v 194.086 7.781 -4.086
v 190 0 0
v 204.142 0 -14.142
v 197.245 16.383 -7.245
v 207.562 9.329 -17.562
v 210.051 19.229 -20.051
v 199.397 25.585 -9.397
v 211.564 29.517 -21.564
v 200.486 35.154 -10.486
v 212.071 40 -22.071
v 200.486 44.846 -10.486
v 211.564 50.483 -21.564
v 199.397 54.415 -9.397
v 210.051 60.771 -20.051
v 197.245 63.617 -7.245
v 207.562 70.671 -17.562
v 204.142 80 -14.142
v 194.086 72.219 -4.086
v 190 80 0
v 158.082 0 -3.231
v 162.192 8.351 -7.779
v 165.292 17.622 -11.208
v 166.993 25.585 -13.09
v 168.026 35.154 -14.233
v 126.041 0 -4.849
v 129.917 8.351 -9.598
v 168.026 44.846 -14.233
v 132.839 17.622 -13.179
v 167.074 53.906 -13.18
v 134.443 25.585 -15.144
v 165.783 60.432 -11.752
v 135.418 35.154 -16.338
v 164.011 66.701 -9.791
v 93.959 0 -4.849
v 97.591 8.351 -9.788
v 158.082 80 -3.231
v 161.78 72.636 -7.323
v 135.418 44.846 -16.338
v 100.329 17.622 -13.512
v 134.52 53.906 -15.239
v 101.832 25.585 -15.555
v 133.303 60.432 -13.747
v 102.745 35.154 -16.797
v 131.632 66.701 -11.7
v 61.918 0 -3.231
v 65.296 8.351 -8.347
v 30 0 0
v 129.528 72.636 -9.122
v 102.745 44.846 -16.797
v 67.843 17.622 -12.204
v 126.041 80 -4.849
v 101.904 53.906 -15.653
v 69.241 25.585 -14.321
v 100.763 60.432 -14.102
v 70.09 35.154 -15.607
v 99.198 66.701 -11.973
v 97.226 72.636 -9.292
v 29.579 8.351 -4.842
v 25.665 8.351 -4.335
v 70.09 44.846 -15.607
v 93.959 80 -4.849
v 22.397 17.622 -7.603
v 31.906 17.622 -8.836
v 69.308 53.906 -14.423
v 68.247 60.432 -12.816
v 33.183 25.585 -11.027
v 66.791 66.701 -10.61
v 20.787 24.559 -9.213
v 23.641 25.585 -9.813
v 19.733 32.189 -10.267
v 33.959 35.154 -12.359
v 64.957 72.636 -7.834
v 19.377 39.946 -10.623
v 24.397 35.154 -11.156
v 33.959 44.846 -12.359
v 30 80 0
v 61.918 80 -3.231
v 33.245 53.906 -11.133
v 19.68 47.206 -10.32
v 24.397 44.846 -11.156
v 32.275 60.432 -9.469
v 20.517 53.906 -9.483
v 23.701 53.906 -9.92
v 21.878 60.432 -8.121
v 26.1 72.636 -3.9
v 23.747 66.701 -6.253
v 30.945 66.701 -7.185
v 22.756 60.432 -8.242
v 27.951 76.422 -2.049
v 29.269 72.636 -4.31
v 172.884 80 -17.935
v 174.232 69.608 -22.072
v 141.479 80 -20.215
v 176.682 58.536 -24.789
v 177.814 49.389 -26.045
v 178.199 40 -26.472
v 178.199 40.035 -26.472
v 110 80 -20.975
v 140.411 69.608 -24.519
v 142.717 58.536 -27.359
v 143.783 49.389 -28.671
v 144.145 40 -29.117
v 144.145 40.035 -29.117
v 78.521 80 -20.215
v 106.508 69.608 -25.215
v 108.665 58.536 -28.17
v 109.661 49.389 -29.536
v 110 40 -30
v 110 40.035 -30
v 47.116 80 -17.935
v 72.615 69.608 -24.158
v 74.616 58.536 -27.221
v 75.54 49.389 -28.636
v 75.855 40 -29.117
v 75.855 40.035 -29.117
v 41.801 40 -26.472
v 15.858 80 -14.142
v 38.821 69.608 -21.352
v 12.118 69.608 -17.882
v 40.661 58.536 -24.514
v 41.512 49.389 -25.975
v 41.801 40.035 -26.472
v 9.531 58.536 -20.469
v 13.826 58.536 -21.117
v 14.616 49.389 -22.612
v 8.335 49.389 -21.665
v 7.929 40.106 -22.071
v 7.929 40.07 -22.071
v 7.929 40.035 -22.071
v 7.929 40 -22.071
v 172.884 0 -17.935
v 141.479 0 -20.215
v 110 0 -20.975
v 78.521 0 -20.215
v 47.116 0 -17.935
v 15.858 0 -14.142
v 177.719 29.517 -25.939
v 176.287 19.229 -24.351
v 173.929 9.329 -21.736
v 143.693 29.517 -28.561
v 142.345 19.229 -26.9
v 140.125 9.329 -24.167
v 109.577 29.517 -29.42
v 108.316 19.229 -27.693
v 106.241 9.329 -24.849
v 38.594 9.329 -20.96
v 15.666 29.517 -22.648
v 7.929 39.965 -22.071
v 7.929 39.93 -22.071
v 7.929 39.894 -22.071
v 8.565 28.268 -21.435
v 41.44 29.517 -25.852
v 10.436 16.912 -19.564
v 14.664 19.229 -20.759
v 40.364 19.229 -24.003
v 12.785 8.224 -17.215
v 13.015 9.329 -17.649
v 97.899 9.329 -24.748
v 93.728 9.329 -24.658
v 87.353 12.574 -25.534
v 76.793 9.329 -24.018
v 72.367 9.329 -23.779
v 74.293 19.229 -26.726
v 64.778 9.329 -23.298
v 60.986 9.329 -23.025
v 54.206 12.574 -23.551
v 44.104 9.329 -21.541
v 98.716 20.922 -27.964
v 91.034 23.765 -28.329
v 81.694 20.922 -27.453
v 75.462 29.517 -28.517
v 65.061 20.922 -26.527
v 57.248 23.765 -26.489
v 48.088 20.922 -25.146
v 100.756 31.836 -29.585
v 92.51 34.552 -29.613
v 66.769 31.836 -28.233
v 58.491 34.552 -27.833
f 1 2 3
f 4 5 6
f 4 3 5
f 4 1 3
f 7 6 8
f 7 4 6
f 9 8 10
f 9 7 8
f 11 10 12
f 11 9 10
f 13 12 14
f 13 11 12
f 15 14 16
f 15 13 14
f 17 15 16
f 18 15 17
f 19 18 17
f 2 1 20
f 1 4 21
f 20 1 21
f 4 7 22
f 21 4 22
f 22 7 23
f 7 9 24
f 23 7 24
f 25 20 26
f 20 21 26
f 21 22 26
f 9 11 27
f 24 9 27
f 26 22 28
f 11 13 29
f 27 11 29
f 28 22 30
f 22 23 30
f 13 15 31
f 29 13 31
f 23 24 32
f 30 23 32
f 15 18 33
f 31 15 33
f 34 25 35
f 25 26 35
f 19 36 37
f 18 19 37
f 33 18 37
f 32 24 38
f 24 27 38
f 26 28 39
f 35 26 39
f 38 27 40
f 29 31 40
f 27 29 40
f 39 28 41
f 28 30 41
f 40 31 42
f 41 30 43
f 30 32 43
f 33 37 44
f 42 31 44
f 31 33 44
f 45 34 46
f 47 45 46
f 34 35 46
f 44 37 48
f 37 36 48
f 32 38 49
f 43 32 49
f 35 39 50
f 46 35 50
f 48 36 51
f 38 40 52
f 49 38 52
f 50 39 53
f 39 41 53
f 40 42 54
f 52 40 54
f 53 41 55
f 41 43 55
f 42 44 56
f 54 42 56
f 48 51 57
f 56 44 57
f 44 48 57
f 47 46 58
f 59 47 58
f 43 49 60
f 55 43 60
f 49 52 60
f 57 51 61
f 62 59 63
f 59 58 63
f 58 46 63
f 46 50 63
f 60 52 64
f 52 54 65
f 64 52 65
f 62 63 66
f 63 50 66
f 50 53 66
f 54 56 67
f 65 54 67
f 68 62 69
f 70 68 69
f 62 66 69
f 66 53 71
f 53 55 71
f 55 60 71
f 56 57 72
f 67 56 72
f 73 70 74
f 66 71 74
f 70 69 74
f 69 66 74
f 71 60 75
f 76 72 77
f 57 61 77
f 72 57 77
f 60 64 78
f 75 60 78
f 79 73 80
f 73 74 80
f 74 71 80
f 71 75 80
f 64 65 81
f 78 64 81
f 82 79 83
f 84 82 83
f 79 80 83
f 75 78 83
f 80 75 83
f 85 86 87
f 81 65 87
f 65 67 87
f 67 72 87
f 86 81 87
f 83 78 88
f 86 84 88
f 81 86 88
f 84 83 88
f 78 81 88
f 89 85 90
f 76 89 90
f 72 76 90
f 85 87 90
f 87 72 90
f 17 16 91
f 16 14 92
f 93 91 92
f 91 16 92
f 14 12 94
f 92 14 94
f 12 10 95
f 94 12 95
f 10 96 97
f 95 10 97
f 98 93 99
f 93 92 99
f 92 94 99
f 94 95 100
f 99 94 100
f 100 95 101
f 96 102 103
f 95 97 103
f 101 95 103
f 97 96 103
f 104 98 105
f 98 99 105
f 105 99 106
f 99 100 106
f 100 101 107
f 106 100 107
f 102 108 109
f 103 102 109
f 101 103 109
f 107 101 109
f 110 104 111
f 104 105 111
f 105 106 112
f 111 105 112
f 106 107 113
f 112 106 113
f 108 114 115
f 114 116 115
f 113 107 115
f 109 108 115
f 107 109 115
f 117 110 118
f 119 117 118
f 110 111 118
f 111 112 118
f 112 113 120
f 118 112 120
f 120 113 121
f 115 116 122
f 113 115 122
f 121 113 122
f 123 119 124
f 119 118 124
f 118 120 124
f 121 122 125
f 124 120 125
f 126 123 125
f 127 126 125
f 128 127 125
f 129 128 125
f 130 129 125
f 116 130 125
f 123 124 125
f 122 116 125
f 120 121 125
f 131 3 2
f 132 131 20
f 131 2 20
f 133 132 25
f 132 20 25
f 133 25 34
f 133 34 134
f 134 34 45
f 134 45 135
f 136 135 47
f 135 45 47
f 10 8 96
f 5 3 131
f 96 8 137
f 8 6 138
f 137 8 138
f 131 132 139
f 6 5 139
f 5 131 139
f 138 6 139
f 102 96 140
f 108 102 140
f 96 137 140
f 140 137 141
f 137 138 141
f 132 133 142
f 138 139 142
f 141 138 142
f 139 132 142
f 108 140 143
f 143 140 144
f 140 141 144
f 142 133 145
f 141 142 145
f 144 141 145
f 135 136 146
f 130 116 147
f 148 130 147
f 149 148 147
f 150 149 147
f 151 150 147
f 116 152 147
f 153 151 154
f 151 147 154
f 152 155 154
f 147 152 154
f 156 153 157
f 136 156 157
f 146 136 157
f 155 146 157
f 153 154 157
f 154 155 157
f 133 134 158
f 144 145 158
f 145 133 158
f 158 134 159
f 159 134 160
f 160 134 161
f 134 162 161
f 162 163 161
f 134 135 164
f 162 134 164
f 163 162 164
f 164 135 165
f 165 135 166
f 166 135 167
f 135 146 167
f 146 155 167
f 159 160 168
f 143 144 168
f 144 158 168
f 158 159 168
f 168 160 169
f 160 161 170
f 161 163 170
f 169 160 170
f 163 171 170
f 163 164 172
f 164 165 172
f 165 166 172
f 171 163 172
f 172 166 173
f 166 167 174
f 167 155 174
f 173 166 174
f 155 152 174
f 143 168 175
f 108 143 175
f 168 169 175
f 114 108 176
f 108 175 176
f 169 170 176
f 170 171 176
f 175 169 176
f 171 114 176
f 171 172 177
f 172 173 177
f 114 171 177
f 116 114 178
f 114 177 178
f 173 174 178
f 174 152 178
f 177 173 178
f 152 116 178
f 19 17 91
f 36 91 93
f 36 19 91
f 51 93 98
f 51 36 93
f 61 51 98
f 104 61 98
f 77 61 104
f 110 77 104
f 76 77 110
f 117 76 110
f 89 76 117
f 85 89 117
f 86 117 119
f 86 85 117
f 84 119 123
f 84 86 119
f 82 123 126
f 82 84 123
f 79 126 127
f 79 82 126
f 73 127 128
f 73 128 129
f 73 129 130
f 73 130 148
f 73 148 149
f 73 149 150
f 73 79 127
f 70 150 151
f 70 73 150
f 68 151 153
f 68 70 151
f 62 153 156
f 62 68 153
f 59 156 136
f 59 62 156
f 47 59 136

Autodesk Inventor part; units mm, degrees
ref_plane "YZ Plane" through (0, 0, 0) normal (1, 0, 0) x (0, 1, 0)
ref_plane "XZ Plane" through (0, 0, 0) normal (0, 1, 0) x (-1, 0, 0)
ref_plane "XY Plane" through (0, 0, 0) normal (0, 0, 1) x (1, 0, 0)
sketch "Эскиз1" plane through (0, 0, 0) normal (0, 1, 0) x (-1, 0, 0)
  line L0 (0, 0) -> (-220, 0)
  line L1 (-220, 0) -> (-220, -30)
  line L2 (-220, -30) -> (0, -30)
  line L3 (0, -30) -> (0, 0)
  dimension "d0" = 220
  dimension "d1" = 30
extrude "Выдавливание1" add sketch "Эскиз1" along normal blind 80
chamfer "Фаска1" distance 30 angle 45 2 edges at (0, 40, 0) (220, 40, 0)
sketch "Эскиз2" plane through (0, 80, 0) normal (0, 1, 0) x (1, 0, 0)
  line L0 (220, 30) -> (190, 0) projected
  line L1 (220, 30) -> (0, 30) projected
  line L2 (30, 0) -> (0, 30) projected
  line L3 (30, 0) -> (190, 0) projected
  arc A0 (212.0711, 22.0711) -> (7.9289, 22.0711) centre (110, -630.9573) ccw
  line L4 (0, 30) -> (30, 0) projected
  line L5 (15, 15) -> (7.9289, 22.0711)
  line L6 (220, 30) -> (190, 0) projected
  line L7 (220, 30) -> (0, 30) projected
  arc A1 (190, 0) -> (30, 0) centre (110, -630.9573) ccw
  line L8 (30, 0) -> (190, 0) projected
  point P0 (0, 0)
  point P1 (110, 0)
  point P2 (110, 0)
  dimension "d7" = 10
extrude "Выдавливание2" cut sketch "Эскиз2" against normal through all contours L0 A0 L1 | A0 L2 L1 | L3 A1
sketch "Эскиз3" plane through (212.0711, 0, -22.0711) normal (0.7071068, 0, 0.7071068) x (0.7071068, 0, -0.7071068)
  line L0 (0, 0) -> (0, 80) projected
  line L1 (0, 80) -> (-31.2132, 80) projected
  line L2 (-31.2132, 80) -> (-31.2132, 0) projected
  line L3 (-31.2132, 0) -> (0, 0) projected
  line L4 (0, 80) -> (-31.2132, 80) projected
  arc A0 (-11.2132, 0) -> (-11.2132, 80) centre (-76.9511, 40) ccw
  line L5 (-31.2132, 0) -> (0, 0) projected
  line L6 (0, 0) -> (0, 80) projected
  arc A1 (-31.2132, 0) -> (-31.2132, 80) centre (-76.9511, 40) ccw
  line L7 (-31.2132, 80) -> (-31.2132, 0) projected
  line L8 (-31.2132, 0) -> (-11.2132, 0)
  line L9 (-31.2132, 80) -> (-11.2132, 80)
  point P0 (-31.2132, 40)
  point P1 (-31.2132, 40)
  dimension "d10" = 20
  dimension "d11" = 60.7614
  dimension "d12" = 76.9511
sketch3d "3D эскиз1"
  arc A0 (212.0711, 80, -22.0711) -> (7.9289, 80, -22.0711) centre (110, 80, 630.9573) ccw
sweep "Сдвиг1" cut profiles "Эскиз3" path "3D эскиз1" contours L3 A0 L0 | A0 L1 L0 | L2 A1
properties part number "dou_long" material "Красное дерево"
